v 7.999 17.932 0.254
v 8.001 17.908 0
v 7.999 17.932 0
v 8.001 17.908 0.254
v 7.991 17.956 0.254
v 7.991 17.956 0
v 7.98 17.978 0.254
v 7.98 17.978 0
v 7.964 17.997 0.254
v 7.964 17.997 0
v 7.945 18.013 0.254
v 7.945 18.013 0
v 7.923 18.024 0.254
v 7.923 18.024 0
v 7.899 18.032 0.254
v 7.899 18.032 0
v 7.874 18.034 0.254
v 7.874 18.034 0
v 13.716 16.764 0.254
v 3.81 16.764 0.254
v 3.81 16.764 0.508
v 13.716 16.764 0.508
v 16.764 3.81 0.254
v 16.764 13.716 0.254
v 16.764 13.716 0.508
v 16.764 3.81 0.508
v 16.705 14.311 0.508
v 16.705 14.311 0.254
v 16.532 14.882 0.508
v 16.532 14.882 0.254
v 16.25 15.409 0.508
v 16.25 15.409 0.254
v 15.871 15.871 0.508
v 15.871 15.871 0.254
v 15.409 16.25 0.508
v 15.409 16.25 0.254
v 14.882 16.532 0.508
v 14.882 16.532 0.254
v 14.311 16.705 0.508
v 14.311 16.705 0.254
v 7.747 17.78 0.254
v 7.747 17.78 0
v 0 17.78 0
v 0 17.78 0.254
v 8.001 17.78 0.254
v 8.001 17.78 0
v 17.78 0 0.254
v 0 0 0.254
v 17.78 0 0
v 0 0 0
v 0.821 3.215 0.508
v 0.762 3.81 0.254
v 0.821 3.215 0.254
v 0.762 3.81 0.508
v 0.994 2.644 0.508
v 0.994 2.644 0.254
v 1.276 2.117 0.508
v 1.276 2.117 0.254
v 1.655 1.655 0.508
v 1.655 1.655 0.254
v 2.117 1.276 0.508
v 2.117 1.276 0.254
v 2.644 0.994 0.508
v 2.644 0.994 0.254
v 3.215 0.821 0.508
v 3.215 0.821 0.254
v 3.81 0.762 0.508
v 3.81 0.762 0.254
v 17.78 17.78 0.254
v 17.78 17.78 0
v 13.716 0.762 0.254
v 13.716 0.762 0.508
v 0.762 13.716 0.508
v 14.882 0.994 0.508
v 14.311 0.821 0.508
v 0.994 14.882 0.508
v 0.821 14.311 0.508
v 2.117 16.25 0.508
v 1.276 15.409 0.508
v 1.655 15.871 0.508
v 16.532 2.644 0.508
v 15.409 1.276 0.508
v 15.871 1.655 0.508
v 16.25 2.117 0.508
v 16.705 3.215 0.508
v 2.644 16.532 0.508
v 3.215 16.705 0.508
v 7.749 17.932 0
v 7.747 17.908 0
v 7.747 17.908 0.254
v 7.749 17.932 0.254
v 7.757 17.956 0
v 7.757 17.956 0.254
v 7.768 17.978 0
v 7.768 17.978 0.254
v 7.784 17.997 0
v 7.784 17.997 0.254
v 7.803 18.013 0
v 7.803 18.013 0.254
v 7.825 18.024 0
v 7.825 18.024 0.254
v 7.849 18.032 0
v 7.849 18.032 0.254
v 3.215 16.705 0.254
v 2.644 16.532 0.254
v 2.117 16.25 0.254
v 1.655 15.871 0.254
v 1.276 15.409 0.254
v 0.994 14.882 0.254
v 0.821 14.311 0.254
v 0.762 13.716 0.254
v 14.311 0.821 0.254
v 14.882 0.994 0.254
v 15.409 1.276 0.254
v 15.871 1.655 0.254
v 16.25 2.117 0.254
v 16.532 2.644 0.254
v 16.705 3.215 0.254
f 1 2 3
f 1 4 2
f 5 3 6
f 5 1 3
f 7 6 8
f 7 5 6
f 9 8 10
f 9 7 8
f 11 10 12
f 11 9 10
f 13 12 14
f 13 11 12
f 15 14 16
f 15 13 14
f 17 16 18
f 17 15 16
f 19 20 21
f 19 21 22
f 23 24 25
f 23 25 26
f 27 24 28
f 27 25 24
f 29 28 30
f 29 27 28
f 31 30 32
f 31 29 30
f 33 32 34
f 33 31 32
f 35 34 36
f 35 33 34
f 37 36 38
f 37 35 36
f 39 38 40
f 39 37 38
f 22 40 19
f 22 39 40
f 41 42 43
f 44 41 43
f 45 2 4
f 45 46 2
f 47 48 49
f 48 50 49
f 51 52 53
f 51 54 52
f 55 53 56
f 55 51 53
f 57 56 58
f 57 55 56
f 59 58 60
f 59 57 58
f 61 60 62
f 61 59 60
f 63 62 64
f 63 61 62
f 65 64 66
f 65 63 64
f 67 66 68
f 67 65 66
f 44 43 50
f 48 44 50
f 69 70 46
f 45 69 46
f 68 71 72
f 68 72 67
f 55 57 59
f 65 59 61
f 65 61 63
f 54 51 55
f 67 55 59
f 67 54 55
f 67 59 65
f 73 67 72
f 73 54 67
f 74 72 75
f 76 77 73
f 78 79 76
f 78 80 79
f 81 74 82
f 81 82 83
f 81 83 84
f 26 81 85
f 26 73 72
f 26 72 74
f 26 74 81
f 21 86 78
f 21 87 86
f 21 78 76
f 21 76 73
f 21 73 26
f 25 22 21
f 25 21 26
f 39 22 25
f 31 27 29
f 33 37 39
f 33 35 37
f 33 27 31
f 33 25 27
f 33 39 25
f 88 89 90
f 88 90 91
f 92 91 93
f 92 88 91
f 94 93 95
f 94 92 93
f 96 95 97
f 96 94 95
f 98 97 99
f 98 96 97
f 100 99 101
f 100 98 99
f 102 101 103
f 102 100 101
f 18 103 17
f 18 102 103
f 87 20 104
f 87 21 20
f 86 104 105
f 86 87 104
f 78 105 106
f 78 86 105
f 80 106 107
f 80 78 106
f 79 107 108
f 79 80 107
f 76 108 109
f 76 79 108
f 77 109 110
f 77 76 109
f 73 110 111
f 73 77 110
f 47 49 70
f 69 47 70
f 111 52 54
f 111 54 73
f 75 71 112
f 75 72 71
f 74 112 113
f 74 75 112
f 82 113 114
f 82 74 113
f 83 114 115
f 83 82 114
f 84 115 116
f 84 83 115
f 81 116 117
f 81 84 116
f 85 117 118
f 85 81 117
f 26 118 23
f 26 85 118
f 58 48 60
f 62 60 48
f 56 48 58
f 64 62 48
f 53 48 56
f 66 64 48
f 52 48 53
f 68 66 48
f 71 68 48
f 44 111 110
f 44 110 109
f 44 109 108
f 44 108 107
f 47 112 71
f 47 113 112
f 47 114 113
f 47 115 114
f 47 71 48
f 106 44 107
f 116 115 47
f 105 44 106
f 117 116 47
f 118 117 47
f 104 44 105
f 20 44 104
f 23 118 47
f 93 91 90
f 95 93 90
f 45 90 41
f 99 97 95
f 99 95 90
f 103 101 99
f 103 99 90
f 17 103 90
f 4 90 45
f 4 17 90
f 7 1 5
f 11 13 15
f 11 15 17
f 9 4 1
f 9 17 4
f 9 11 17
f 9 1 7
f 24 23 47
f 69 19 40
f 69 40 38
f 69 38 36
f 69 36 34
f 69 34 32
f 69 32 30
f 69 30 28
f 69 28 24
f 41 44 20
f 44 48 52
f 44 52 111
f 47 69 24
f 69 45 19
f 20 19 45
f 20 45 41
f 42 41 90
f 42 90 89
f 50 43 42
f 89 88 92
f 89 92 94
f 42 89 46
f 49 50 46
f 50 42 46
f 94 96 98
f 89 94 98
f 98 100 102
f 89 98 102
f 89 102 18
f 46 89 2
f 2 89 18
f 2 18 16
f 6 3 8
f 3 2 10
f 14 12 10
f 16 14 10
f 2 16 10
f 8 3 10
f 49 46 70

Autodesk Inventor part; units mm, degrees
ref_plane "YZ Plane" through (0, 0, 0) normal (1, 0, 0) x (0, 1, 0)
ref_plane "XZ Plane" through (0, 0, 0) normal (0, 1, 0) x (-1, 0, 0)
ref_plane "XY Plane" through (0, 0, 0) normal (0, 0, 1) x (1, 0, 0)
sketch "Sketch1" plane through (0, 0, 0) normal (0, 0, 1) x (1, 0, 0)
  line L0 (0, 0) -> (17.78, 0)
  line L1 (17.78, 0) -> (17.78, 17.78)
  line L2 (17.78, 17.78) -> (0, 17.78)
  line L3 (0, 17.78) -> (0, 0)
  dimension "d0" = 17.78
extrude "Extrusion1" add sketch "Sketch1" along normal blind 0.254
sketch "Sketch2" plane through (0, 0, 0.254) normal (0, 0, 1) x (1, 0, 0)
  line L0 (0.762, 16.764) -> (16.764, 16.764)
  line L1 (16.764, 16.764) -> (16.764, 0.762)
  line L2 (16.764, 0.762) -> (0.762, 0.762)
  line L3 (0.762, 0.762) -> (0.762, 16.764)
  line L4 (0, 0) -> (17.78, 0) projected
  line L5 (0, 17.78) -> (0, 0) projected
  point P0 (0.762, 0.762)
  dimension "d3" = 16.002
  dimension "d4" = 0.762
  dimension "d5" = 0.762
extrude "Extrusion2" add sketch "Sketch2" along normal blind 0.254
fillet "Fillet1" radius 3.048 1 edges at (0.762, 0.762, 0.381)
fillet "Fillet2" radius 3.048 3 edges at (16.764, 0.762, 0.381) (16.764, 16.764, 0.381) (0.762, 16.764, 0.381)
sketch "Sketch3" plane through (0, 17.78, 0) normal (0, 1, 0) x (1, 0, 0)
  line L0 (17.78, 0) -> (0, 0) projected
  line L1 (0, -0.254) -> (17.78, -0.254) projected
  line L2 (7.747, 0) -> (8.001, 0)
  line L3 (8.001, 0) -> (8.001, -0.254)
  line L4 (8.001, -0.254) -> (7.747, -0.254)
  line L5 (7.747, -0.254) -> (7.747, 0)
  dimension "d10" = 7.747
  dimension "d11" = 0.254
extrude "Extrusion3" add sketch "Sketch3" along normal blind 0.254
fillet "Fillet3" radius 0.127 2 edges at (8.001, 18.034, 0.127) (7.747, 18.034, 0.127)
properties part number "plate" material "Gold"
